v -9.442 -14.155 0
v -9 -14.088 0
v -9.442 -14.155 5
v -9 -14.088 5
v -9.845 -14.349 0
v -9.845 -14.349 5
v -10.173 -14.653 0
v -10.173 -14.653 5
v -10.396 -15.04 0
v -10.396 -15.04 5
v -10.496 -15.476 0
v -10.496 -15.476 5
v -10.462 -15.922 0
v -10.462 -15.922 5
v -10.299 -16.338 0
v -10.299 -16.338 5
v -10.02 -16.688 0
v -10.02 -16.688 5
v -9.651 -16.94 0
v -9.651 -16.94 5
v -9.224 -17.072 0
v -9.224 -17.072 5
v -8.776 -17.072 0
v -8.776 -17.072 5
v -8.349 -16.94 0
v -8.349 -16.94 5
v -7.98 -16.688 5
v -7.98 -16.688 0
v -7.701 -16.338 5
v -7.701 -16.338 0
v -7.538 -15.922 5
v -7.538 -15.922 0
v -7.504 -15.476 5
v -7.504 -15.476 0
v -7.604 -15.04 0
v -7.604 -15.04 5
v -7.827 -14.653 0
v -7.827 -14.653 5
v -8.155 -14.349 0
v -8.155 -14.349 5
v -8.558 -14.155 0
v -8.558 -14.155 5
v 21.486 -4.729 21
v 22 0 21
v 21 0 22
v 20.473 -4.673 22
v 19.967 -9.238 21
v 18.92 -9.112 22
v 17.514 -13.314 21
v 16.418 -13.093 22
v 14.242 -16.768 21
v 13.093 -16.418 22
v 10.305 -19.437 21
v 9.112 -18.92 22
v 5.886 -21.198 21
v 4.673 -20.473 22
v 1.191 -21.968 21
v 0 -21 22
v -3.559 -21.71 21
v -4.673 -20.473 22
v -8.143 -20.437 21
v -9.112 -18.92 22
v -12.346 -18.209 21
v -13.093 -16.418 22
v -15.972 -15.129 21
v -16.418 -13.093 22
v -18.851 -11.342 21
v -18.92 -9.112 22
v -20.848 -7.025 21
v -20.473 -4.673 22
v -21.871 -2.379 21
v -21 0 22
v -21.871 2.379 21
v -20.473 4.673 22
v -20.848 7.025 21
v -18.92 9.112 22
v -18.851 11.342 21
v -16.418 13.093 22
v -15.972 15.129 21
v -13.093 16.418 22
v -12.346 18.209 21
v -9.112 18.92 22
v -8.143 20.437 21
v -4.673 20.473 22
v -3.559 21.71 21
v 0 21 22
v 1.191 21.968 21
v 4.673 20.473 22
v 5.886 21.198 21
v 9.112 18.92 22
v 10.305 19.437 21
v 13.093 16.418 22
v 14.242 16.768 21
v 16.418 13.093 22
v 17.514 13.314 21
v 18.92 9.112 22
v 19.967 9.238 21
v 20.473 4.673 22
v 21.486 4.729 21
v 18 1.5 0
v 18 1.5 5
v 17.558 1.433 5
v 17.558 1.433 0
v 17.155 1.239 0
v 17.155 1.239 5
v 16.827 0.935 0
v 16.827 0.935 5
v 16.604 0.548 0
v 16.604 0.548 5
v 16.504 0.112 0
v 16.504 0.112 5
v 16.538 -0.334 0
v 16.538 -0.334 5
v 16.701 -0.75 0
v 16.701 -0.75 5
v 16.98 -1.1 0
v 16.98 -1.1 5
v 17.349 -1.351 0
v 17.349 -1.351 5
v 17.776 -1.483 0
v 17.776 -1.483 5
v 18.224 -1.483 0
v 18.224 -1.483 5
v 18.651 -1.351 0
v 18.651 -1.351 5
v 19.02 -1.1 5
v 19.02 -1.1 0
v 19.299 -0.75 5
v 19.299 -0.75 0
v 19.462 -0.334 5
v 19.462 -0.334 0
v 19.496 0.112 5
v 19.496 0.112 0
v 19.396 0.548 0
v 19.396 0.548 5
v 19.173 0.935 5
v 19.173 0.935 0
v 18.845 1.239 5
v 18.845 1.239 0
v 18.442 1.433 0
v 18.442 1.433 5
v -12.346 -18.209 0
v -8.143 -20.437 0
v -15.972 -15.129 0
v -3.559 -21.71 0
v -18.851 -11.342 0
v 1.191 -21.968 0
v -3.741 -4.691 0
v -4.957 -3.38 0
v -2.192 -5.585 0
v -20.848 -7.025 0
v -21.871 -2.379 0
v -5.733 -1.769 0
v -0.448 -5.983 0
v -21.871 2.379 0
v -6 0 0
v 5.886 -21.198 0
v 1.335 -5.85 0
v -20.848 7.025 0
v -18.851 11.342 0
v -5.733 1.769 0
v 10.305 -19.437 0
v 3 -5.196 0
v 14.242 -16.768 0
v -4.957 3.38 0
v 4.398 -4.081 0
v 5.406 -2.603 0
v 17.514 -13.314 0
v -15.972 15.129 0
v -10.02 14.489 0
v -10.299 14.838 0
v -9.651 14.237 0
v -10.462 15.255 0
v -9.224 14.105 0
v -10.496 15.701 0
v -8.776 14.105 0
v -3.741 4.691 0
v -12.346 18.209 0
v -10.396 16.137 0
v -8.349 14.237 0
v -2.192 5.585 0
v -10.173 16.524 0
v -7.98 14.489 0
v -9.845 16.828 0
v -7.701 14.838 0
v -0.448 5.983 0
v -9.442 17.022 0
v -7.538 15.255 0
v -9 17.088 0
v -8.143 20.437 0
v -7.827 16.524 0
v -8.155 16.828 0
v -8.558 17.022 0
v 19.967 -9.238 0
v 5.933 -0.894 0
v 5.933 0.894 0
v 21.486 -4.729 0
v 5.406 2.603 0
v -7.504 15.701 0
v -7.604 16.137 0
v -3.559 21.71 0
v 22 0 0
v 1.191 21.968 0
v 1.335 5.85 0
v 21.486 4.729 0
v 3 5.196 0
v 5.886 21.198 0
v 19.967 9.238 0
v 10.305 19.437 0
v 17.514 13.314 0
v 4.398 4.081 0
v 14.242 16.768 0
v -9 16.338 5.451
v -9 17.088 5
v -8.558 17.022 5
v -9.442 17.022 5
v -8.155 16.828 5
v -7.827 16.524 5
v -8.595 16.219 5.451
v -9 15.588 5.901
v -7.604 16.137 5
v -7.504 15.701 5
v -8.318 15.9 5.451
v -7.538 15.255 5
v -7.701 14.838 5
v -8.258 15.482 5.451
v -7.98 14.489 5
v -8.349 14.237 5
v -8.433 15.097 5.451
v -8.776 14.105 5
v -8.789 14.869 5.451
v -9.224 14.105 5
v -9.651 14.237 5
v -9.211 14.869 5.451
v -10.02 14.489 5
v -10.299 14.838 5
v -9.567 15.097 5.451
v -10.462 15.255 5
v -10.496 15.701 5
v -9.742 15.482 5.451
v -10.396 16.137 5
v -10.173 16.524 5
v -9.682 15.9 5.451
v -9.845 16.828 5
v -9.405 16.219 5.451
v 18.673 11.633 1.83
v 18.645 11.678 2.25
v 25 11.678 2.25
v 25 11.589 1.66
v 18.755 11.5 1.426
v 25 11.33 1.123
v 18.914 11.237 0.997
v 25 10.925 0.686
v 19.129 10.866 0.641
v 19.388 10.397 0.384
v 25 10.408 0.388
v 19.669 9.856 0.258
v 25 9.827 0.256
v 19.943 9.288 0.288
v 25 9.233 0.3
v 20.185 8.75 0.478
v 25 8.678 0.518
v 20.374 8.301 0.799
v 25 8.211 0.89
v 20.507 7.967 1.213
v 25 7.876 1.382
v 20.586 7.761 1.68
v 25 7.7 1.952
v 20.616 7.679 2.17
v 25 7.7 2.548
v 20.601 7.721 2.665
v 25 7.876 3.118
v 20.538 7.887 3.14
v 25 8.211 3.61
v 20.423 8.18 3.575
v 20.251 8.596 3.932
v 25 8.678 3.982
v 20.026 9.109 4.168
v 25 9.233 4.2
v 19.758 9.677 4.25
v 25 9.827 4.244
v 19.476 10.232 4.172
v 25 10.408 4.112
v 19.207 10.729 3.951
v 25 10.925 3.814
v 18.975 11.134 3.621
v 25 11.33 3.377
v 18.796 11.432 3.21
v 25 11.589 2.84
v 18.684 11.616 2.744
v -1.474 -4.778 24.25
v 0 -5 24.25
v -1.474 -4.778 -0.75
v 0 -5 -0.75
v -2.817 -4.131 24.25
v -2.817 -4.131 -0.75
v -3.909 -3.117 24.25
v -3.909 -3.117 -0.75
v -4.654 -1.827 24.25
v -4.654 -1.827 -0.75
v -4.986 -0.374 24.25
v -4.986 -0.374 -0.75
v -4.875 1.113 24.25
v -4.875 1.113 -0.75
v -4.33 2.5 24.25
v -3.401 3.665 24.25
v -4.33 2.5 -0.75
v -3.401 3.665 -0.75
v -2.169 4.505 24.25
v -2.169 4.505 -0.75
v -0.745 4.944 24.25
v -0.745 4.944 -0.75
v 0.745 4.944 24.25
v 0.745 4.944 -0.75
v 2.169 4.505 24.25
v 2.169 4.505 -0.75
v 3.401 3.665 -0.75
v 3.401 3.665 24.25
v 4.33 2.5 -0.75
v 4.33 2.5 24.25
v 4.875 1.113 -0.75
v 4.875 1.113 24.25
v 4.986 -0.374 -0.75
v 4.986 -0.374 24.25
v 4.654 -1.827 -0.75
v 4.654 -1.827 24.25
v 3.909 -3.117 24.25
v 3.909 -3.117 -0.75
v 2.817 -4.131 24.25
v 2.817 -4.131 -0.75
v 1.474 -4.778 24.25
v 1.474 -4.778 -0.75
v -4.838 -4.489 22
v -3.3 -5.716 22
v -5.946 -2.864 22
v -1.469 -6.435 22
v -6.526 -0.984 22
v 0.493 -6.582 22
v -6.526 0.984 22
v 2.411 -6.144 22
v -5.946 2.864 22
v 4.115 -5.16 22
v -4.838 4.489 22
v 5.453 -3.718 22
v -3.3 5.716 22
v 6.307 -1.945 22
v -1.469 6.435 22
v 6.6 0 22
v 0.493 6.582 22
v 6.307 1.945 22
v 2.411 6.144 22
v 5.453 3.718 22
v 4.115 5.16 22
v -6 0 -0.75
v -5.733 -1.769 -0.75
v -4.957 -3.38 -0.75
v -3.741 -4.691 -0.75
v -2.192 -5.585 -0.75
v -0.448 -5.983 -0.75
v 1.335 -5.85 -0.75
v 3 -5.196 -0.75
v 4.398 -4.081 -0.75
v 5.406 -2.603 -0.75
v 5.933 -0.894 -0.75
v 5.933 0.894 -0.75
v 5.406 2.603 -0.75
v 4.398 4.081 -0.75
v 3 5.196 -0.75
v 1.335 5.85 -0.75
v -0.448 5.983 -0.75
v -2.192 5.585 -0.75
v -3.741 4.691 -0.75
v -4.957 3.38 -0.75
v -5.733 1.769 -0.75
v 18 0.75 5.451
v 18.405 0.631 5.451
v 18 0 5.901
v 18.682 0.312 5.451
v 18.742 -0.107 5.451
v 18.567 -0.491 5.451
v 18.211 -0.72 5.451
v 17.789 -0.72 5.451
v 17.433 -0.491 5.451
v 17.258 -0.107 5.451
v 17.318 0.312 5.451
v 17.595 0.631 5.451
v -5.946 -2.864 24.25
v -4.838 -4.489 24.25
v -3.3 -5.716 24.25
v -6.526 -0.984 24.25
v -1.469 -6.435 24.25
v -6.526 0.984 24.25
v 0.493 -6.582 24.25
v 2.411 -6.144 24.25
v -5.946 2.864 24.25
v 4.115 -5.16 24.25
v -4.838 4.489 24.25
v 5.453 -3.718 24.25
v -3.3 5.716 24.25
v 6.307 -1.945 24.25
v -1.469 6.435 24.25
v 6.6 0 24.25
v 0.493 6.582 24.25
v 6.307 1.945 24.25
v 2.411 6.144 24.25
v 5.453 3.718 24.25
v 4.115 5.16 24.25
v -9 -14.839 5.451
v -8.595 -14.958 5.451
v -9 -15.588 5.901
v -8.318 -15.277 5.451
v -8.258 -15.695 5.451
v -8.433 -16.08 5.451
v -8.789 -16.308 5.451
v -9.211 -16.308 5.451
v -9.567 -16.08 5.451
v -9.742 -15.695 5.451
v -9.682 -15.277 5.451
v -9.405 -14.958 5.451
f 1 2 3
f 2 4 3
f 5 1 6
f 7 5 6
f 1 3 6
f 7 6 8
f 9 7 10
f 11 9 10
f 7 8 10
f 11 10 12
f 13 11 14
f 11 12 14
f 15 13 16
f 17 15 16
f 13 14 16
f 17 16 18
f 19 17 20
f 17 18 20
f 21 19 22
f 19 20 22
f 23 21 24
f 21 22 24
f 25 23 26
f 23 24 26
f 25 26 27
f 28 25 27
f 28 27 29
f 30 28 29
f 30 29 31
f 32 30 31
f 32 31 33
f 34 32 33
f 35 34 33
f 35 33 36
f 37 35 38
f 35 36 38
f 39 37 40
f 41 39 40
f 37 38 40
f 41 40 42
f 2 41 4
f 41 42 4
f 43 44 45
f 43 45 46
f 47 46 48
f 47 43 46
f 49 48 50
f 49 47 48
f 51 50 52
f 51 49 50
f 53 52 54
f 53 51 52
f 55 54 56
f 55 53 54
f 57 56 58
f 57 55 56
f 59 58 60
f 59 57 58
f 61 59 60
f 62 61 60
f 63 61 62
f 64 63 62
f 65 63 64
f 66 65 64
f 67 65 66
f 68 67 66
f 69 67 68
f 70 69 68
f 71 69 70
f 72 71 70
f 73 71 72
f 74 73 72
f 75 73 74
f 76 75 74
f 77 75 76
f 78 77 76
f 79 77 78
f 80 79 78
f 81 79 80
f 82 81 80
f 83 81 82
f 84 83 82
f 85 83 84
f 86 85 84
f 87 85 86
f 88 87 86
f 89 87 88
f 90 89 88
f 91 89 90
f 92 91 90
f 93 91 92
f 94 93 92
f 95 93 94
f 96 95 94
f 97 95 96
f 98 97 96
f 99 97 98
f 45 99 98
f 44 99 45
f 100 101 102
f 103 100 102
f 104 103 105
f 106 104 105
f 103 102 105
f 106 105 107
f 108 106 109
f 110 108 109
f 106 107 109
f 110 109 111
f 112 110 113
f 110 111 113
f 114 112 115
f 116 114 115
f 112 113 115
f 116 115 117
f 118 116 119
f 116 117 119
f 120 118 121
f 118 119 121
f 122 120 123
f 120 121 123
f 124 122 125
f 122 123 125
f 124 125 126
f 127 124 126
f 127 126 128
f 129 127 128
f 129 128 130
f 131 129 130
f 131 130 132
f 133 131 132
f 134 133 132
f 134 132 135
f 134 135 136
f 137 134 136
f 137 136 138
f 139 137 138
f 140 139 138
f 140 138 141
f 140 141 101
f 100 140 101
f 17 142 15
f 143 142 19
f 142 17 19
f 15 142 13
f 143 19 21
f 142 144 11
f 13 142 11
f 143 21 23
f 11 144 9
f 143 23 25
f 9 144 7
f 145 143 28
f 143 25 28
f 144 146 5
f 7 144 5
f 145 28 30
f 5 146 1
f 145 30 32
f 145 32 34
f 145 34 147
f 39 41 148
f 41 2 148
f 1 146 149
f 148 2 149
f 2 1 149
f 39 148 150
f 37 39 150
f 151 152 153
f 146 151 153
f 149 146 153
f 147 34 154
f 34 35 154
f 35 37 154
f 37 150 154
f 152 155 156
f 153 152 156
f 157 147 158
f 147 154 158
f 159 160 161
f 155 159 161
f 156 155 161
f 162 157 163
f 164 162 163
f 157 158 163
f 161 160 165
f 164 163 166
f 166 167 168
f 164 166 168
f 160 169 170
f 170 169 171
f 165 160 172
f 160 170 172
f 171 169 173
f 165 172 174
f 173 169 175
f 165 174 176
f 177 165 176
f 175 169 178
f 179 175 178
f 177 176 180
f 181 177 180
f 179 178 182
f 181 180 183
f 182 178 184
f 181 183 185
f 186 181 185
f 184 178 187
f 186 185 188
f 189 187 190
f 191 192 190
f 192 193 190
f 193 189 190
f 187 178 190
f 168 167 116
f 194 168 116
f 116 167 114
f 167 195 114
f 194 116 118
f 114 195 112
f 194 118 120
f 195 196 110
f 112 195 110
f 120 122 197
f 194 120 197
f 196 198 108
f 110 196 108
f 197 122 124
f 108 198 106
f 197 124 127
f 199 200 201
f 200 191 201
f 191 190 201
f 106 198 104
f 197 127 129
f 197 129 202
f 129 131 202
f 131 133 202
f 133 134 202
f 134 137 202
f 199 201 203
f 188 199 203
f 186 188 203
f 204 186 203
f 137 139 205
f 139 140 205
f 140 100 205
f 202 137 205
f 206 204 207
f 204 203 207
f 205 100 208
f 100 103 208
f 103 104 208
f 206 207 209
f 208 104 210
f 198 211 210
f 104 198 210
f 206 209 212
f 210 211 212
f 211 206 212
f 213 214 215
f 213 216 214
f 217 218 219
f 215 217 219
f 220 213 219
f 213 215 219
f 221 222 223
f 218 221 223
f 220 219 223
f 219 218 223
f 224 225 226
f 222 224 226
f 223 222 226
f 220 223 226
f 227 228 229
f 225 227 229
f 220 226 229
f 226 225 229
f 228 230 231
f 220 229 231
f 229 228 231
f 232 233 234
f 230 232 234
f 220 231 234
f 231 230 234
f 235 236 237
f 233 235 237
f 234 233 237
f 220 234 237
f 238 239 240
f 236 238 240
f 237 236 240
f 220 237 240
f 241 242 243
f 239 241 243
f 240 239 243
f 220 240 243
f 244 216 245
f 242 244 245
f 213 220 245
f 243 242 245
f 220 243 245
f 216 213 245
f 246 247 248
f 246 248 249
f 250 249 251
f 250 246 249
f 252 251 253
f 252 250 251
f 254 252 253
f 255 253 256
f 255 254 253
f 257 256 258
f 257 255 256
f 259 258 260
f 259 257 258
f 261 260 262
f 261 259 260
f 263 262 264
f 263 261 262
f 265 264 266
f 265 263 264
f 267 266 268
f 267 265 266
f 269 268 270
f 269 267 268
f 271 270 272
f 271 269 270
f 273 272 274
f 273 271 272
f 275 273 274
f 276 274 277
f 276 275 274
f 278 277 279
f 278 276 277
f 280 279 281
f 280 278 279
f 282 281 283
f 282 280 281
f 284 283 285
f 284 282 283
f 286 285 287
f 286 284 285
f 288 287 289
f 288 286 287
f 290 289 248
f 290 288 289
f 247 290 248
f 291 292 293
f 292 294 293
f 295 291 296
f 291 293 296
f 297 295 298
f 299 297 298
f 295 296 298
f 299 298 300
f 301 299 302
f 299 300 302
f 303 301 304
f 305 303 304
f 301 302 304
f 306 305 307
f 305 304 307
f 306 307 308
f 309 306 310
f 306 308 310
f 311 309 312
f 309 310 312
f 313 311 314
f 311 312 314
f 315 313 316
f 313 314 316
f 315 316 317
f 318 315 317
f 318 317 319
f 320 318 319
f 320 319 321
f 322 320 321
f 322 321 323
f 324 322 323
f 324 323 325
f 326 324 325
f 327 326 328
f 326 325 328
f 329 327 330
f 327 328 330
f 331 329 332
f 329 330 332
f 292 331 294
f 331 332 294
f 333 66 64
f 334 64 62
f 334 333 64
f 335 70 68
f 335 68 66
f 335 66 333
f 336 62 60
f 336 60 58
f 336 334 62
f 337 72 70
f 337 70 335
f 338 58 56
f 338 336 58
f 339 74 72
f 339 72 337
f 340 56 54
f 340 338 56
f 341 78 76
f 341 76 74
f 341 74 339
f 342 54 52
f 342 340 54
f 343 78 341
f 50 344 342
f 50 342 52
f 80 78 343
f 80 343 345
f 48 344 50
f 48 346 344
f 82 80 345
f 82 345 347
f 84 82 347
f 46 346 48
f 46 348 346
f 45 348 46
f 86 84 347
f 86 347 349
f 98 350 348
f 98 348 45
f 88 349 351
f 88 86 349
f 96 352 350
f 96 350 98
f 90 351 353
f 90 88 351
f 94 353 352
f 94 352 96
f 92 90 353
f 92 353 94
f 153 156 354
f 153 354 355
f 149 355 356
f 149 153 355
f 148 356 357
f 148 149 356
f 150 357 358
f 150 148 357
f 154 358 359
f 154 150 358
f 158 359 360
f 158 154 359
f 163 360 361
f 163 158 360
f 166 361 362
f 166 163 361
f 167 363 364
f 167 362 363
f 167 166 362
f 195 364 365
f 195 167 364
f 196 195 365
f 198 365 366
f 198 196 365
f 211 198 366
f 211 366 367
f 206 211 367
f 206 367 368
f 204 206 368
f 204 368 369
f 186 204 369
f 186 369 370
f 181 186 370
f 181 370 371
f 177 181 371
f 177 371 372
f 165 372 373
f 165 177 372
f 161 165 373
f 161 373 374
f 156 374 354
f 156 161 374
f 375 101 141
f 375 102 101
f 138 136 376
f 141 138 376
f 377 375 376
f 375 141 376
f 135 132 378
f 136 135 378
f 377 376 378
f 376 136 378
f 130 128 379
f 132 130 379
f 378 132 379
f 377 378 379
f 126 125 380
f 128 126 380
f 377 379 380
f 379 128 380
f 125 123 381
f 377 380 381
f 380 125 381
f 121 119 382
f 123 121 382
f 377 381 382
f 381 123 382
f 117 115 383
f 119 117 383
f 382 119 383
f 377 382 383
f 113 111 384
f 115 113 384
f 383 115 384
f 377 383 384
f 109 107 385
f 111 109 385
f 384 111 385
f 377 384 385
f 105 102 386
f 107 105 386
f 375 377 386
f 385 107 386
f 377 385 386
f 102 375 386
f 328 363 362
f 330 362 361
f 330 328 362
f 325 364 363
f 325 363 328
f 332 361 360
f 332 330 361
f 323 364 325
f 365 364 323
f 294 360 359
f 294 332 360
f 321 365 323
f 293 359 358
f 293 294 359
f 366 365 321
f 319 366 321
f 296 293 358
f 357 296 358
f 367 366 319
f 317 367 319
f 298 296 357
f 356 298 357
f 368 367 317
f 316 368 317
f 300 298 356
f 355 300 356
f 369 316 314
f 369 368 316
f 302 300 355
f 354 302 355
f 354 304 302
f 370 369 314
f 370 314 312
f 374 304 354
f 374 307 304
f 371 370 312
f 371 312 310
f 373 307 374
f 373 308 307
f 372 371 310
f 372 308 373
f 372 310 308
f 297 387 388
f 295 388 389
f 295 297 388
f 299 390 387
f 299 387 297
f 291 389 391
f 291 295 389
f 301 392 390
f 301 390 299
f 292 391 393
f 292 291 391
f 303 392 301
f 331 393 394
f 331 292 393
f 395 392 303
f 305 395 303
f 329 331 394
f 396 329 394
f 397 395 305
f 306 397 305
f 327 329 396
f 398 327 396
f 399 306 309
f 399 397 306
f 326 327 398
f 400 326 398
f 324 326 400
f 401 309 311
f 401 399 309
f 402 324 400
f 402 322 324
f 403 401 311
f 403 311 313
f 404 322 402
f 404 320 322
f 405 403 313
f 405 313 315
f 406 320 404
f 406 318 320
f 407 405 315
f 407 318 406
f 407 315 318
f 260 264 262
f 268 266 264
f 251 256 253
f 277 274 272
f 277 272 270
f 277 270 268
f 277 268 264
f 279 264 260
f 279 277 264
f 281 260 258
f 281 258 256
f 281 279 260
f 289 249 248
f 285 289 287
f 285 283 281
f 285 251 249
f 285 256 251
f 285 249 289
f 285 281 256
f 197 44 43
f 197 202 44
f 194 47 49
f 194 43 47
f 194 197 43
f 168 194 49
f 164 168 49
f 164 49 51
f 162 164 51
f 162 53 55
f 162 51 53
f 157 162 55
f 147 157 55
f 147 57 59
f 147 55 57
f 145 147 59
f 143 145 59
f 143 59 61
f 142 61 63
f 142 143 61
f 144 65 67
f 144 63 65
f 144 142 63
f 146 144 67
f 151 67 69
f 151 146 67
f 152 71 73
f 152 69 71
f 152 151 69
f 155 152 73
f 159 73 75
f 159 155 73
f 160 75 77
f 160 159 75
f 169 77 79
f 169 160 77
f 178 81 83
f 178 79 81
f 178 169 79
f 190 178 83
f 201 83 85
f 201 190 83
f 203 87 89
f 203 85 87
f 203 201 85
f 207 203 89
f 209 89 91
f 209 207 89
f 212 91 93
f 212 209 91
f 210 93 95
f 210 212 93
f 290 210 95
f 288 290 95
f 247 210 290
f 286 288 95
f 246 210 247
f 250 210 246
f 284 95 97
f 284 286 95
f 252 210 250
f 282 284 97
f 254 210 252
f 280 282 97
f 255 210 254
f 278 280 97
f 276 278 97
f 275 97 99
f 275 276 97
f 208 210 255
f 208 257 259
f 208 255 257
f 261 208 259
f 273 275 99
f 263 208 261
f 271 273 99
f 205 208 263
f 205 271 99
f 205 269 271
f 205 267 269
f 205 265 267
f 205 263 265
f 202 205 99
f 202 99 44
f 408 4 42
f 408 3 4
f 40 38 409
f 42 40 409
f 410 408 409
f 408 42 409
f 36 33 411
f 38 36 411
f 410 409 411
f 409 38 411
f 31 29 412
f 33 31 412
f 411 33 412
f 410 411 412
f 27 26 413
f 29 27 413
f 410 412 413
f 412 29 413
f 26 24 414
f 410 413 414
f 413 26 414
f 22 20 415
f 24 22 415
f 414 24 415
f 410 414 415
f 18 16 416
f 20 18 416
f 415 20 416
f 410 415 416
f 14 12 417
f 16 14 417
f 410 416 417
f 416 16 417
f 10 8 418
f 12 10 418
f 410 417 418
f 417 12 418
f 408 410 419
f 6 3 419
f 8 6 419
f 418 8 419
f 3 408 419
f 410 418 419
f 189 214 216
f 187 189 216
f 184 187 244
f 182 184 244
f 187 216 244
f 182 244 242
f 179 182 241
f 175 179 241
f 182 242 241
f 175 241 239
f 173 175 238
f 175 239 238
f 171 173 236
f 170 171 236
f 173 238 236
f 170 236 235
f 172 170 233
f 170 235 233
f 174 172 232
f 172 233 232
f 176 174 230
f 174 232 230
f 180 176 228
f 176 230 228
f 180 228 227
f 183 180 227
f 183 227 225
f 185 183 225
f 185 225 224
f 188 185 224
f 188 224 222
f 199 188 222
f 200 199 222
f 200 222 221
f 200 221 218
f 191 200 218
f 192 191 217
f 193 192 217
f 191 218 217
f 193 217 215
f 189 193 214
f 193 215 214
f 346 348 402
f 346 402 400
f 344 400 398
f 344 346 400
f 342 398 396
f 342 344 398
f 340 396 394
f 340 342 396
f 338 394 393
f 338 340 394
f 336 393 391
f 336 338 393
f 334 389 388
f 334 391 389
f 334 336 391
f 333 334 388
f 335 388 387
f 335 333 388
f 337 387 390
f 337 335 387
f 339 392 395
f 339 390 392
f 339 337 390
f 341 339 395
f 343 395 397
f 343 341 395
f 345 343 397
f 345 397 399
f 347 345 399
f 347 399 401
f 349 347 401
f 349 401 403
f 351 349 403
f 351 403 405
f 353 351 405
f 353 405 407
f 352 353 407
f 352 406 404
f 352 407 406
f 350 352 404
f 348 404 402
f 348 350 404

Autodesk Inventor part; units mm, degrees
ref_plane "YZ Plane" through (0, 0, 0) normal (1, 0, 0) x (0, 1, 0)
ref_plane "XZ Plane" through (0, 0, 0) normal (0, 1, 0) x (-1, 0, 0)
ref_plane "XY Plane" through (0, 0, 0) normal (0, 0, 1) x (1, 0, 0)
sketch "スケッチ1" plane through (0, 0, 0) normal (0, 0, 1) x (1, 0, 0)
  circle A0 centre (0, 0) radius 22
  dimension "d0" = 44
extrude "押し出し1" add sketch "スケッチ1" along normal blind 22
chamfer "面取り1" distance 1 angle 45 1 edges at (-22, 0, 22)
sketch "スケッチ2" plane through (0, 0, 22) normal (0, 0, 1) x (1, 0, 0)
  circle A0 centre (0, 0) radius 6.6
  dimension "d6" = 13.2
extrude "押し出し2" add sketch "スケッチ2" along normal blind 2.25
sketch "スケッチ6" plane through (0, 0, 0) normal (0, 0, 1) x (1, 0, 0)
  point P0 (0, 0)
sketch "スケッチ8" plane through (0, 0, 0) normal (0, 1, 0) x (-1, 0, 0)
  point P0 (0, 0)
sketch "スケッチ9" plane through (0, 0, 0) normal (1, 0, 0) x (0, 1, 0)
  line L0 (-22, 0) -> (22, 0) projected
  circle A0 centre (9.6776, 2.25) radius 2
  point P0 (0, 0)
  dimension "d30" = 2.25
  dimension "d31" = 4
extrude "押し出し3" add sketch "スケッチ9" along normal blind 25
sketch "スケッチ12" plane through (0, 0, 0) normal (0, 0, -1) x (-1, 0, 0)
  circle A0 centre (0, 0) radius 6
  dimension "d44" = 12
extrude "押し出し5" add sketch "スケッチ12" along normal blind 0.75
sketch "スケッチ13" plane through (0, 0, 24.25) normal (0, 0, 1) x (1, 0, 0)
  point P0 (0, 0)
  point P1 (0, 0)
hole "穴4" at (0, 0, 24.25) direction (0, 0, -1) diameter 10 end through all
sketch "スケッチ14" plane through (0, 0, 0) normal (0, 0, -1) x (-1, 0, 0)
  point P0 (0, 0)
  point P1 (-18, 0)
  point P2 (9, -15.5885)
  point P3 (9, 15.5885)
  dimension "d54" = 18
  dimension "d57" = 360
hole "穴5" at (18, 0, 0) at (-9, -15.5885, 0) at (-9, 15.5885, 0) direction (0, 0, 1) diameter 3 depth 5 tip angle 118
properties part number "meh-30-pエンコーダ"
